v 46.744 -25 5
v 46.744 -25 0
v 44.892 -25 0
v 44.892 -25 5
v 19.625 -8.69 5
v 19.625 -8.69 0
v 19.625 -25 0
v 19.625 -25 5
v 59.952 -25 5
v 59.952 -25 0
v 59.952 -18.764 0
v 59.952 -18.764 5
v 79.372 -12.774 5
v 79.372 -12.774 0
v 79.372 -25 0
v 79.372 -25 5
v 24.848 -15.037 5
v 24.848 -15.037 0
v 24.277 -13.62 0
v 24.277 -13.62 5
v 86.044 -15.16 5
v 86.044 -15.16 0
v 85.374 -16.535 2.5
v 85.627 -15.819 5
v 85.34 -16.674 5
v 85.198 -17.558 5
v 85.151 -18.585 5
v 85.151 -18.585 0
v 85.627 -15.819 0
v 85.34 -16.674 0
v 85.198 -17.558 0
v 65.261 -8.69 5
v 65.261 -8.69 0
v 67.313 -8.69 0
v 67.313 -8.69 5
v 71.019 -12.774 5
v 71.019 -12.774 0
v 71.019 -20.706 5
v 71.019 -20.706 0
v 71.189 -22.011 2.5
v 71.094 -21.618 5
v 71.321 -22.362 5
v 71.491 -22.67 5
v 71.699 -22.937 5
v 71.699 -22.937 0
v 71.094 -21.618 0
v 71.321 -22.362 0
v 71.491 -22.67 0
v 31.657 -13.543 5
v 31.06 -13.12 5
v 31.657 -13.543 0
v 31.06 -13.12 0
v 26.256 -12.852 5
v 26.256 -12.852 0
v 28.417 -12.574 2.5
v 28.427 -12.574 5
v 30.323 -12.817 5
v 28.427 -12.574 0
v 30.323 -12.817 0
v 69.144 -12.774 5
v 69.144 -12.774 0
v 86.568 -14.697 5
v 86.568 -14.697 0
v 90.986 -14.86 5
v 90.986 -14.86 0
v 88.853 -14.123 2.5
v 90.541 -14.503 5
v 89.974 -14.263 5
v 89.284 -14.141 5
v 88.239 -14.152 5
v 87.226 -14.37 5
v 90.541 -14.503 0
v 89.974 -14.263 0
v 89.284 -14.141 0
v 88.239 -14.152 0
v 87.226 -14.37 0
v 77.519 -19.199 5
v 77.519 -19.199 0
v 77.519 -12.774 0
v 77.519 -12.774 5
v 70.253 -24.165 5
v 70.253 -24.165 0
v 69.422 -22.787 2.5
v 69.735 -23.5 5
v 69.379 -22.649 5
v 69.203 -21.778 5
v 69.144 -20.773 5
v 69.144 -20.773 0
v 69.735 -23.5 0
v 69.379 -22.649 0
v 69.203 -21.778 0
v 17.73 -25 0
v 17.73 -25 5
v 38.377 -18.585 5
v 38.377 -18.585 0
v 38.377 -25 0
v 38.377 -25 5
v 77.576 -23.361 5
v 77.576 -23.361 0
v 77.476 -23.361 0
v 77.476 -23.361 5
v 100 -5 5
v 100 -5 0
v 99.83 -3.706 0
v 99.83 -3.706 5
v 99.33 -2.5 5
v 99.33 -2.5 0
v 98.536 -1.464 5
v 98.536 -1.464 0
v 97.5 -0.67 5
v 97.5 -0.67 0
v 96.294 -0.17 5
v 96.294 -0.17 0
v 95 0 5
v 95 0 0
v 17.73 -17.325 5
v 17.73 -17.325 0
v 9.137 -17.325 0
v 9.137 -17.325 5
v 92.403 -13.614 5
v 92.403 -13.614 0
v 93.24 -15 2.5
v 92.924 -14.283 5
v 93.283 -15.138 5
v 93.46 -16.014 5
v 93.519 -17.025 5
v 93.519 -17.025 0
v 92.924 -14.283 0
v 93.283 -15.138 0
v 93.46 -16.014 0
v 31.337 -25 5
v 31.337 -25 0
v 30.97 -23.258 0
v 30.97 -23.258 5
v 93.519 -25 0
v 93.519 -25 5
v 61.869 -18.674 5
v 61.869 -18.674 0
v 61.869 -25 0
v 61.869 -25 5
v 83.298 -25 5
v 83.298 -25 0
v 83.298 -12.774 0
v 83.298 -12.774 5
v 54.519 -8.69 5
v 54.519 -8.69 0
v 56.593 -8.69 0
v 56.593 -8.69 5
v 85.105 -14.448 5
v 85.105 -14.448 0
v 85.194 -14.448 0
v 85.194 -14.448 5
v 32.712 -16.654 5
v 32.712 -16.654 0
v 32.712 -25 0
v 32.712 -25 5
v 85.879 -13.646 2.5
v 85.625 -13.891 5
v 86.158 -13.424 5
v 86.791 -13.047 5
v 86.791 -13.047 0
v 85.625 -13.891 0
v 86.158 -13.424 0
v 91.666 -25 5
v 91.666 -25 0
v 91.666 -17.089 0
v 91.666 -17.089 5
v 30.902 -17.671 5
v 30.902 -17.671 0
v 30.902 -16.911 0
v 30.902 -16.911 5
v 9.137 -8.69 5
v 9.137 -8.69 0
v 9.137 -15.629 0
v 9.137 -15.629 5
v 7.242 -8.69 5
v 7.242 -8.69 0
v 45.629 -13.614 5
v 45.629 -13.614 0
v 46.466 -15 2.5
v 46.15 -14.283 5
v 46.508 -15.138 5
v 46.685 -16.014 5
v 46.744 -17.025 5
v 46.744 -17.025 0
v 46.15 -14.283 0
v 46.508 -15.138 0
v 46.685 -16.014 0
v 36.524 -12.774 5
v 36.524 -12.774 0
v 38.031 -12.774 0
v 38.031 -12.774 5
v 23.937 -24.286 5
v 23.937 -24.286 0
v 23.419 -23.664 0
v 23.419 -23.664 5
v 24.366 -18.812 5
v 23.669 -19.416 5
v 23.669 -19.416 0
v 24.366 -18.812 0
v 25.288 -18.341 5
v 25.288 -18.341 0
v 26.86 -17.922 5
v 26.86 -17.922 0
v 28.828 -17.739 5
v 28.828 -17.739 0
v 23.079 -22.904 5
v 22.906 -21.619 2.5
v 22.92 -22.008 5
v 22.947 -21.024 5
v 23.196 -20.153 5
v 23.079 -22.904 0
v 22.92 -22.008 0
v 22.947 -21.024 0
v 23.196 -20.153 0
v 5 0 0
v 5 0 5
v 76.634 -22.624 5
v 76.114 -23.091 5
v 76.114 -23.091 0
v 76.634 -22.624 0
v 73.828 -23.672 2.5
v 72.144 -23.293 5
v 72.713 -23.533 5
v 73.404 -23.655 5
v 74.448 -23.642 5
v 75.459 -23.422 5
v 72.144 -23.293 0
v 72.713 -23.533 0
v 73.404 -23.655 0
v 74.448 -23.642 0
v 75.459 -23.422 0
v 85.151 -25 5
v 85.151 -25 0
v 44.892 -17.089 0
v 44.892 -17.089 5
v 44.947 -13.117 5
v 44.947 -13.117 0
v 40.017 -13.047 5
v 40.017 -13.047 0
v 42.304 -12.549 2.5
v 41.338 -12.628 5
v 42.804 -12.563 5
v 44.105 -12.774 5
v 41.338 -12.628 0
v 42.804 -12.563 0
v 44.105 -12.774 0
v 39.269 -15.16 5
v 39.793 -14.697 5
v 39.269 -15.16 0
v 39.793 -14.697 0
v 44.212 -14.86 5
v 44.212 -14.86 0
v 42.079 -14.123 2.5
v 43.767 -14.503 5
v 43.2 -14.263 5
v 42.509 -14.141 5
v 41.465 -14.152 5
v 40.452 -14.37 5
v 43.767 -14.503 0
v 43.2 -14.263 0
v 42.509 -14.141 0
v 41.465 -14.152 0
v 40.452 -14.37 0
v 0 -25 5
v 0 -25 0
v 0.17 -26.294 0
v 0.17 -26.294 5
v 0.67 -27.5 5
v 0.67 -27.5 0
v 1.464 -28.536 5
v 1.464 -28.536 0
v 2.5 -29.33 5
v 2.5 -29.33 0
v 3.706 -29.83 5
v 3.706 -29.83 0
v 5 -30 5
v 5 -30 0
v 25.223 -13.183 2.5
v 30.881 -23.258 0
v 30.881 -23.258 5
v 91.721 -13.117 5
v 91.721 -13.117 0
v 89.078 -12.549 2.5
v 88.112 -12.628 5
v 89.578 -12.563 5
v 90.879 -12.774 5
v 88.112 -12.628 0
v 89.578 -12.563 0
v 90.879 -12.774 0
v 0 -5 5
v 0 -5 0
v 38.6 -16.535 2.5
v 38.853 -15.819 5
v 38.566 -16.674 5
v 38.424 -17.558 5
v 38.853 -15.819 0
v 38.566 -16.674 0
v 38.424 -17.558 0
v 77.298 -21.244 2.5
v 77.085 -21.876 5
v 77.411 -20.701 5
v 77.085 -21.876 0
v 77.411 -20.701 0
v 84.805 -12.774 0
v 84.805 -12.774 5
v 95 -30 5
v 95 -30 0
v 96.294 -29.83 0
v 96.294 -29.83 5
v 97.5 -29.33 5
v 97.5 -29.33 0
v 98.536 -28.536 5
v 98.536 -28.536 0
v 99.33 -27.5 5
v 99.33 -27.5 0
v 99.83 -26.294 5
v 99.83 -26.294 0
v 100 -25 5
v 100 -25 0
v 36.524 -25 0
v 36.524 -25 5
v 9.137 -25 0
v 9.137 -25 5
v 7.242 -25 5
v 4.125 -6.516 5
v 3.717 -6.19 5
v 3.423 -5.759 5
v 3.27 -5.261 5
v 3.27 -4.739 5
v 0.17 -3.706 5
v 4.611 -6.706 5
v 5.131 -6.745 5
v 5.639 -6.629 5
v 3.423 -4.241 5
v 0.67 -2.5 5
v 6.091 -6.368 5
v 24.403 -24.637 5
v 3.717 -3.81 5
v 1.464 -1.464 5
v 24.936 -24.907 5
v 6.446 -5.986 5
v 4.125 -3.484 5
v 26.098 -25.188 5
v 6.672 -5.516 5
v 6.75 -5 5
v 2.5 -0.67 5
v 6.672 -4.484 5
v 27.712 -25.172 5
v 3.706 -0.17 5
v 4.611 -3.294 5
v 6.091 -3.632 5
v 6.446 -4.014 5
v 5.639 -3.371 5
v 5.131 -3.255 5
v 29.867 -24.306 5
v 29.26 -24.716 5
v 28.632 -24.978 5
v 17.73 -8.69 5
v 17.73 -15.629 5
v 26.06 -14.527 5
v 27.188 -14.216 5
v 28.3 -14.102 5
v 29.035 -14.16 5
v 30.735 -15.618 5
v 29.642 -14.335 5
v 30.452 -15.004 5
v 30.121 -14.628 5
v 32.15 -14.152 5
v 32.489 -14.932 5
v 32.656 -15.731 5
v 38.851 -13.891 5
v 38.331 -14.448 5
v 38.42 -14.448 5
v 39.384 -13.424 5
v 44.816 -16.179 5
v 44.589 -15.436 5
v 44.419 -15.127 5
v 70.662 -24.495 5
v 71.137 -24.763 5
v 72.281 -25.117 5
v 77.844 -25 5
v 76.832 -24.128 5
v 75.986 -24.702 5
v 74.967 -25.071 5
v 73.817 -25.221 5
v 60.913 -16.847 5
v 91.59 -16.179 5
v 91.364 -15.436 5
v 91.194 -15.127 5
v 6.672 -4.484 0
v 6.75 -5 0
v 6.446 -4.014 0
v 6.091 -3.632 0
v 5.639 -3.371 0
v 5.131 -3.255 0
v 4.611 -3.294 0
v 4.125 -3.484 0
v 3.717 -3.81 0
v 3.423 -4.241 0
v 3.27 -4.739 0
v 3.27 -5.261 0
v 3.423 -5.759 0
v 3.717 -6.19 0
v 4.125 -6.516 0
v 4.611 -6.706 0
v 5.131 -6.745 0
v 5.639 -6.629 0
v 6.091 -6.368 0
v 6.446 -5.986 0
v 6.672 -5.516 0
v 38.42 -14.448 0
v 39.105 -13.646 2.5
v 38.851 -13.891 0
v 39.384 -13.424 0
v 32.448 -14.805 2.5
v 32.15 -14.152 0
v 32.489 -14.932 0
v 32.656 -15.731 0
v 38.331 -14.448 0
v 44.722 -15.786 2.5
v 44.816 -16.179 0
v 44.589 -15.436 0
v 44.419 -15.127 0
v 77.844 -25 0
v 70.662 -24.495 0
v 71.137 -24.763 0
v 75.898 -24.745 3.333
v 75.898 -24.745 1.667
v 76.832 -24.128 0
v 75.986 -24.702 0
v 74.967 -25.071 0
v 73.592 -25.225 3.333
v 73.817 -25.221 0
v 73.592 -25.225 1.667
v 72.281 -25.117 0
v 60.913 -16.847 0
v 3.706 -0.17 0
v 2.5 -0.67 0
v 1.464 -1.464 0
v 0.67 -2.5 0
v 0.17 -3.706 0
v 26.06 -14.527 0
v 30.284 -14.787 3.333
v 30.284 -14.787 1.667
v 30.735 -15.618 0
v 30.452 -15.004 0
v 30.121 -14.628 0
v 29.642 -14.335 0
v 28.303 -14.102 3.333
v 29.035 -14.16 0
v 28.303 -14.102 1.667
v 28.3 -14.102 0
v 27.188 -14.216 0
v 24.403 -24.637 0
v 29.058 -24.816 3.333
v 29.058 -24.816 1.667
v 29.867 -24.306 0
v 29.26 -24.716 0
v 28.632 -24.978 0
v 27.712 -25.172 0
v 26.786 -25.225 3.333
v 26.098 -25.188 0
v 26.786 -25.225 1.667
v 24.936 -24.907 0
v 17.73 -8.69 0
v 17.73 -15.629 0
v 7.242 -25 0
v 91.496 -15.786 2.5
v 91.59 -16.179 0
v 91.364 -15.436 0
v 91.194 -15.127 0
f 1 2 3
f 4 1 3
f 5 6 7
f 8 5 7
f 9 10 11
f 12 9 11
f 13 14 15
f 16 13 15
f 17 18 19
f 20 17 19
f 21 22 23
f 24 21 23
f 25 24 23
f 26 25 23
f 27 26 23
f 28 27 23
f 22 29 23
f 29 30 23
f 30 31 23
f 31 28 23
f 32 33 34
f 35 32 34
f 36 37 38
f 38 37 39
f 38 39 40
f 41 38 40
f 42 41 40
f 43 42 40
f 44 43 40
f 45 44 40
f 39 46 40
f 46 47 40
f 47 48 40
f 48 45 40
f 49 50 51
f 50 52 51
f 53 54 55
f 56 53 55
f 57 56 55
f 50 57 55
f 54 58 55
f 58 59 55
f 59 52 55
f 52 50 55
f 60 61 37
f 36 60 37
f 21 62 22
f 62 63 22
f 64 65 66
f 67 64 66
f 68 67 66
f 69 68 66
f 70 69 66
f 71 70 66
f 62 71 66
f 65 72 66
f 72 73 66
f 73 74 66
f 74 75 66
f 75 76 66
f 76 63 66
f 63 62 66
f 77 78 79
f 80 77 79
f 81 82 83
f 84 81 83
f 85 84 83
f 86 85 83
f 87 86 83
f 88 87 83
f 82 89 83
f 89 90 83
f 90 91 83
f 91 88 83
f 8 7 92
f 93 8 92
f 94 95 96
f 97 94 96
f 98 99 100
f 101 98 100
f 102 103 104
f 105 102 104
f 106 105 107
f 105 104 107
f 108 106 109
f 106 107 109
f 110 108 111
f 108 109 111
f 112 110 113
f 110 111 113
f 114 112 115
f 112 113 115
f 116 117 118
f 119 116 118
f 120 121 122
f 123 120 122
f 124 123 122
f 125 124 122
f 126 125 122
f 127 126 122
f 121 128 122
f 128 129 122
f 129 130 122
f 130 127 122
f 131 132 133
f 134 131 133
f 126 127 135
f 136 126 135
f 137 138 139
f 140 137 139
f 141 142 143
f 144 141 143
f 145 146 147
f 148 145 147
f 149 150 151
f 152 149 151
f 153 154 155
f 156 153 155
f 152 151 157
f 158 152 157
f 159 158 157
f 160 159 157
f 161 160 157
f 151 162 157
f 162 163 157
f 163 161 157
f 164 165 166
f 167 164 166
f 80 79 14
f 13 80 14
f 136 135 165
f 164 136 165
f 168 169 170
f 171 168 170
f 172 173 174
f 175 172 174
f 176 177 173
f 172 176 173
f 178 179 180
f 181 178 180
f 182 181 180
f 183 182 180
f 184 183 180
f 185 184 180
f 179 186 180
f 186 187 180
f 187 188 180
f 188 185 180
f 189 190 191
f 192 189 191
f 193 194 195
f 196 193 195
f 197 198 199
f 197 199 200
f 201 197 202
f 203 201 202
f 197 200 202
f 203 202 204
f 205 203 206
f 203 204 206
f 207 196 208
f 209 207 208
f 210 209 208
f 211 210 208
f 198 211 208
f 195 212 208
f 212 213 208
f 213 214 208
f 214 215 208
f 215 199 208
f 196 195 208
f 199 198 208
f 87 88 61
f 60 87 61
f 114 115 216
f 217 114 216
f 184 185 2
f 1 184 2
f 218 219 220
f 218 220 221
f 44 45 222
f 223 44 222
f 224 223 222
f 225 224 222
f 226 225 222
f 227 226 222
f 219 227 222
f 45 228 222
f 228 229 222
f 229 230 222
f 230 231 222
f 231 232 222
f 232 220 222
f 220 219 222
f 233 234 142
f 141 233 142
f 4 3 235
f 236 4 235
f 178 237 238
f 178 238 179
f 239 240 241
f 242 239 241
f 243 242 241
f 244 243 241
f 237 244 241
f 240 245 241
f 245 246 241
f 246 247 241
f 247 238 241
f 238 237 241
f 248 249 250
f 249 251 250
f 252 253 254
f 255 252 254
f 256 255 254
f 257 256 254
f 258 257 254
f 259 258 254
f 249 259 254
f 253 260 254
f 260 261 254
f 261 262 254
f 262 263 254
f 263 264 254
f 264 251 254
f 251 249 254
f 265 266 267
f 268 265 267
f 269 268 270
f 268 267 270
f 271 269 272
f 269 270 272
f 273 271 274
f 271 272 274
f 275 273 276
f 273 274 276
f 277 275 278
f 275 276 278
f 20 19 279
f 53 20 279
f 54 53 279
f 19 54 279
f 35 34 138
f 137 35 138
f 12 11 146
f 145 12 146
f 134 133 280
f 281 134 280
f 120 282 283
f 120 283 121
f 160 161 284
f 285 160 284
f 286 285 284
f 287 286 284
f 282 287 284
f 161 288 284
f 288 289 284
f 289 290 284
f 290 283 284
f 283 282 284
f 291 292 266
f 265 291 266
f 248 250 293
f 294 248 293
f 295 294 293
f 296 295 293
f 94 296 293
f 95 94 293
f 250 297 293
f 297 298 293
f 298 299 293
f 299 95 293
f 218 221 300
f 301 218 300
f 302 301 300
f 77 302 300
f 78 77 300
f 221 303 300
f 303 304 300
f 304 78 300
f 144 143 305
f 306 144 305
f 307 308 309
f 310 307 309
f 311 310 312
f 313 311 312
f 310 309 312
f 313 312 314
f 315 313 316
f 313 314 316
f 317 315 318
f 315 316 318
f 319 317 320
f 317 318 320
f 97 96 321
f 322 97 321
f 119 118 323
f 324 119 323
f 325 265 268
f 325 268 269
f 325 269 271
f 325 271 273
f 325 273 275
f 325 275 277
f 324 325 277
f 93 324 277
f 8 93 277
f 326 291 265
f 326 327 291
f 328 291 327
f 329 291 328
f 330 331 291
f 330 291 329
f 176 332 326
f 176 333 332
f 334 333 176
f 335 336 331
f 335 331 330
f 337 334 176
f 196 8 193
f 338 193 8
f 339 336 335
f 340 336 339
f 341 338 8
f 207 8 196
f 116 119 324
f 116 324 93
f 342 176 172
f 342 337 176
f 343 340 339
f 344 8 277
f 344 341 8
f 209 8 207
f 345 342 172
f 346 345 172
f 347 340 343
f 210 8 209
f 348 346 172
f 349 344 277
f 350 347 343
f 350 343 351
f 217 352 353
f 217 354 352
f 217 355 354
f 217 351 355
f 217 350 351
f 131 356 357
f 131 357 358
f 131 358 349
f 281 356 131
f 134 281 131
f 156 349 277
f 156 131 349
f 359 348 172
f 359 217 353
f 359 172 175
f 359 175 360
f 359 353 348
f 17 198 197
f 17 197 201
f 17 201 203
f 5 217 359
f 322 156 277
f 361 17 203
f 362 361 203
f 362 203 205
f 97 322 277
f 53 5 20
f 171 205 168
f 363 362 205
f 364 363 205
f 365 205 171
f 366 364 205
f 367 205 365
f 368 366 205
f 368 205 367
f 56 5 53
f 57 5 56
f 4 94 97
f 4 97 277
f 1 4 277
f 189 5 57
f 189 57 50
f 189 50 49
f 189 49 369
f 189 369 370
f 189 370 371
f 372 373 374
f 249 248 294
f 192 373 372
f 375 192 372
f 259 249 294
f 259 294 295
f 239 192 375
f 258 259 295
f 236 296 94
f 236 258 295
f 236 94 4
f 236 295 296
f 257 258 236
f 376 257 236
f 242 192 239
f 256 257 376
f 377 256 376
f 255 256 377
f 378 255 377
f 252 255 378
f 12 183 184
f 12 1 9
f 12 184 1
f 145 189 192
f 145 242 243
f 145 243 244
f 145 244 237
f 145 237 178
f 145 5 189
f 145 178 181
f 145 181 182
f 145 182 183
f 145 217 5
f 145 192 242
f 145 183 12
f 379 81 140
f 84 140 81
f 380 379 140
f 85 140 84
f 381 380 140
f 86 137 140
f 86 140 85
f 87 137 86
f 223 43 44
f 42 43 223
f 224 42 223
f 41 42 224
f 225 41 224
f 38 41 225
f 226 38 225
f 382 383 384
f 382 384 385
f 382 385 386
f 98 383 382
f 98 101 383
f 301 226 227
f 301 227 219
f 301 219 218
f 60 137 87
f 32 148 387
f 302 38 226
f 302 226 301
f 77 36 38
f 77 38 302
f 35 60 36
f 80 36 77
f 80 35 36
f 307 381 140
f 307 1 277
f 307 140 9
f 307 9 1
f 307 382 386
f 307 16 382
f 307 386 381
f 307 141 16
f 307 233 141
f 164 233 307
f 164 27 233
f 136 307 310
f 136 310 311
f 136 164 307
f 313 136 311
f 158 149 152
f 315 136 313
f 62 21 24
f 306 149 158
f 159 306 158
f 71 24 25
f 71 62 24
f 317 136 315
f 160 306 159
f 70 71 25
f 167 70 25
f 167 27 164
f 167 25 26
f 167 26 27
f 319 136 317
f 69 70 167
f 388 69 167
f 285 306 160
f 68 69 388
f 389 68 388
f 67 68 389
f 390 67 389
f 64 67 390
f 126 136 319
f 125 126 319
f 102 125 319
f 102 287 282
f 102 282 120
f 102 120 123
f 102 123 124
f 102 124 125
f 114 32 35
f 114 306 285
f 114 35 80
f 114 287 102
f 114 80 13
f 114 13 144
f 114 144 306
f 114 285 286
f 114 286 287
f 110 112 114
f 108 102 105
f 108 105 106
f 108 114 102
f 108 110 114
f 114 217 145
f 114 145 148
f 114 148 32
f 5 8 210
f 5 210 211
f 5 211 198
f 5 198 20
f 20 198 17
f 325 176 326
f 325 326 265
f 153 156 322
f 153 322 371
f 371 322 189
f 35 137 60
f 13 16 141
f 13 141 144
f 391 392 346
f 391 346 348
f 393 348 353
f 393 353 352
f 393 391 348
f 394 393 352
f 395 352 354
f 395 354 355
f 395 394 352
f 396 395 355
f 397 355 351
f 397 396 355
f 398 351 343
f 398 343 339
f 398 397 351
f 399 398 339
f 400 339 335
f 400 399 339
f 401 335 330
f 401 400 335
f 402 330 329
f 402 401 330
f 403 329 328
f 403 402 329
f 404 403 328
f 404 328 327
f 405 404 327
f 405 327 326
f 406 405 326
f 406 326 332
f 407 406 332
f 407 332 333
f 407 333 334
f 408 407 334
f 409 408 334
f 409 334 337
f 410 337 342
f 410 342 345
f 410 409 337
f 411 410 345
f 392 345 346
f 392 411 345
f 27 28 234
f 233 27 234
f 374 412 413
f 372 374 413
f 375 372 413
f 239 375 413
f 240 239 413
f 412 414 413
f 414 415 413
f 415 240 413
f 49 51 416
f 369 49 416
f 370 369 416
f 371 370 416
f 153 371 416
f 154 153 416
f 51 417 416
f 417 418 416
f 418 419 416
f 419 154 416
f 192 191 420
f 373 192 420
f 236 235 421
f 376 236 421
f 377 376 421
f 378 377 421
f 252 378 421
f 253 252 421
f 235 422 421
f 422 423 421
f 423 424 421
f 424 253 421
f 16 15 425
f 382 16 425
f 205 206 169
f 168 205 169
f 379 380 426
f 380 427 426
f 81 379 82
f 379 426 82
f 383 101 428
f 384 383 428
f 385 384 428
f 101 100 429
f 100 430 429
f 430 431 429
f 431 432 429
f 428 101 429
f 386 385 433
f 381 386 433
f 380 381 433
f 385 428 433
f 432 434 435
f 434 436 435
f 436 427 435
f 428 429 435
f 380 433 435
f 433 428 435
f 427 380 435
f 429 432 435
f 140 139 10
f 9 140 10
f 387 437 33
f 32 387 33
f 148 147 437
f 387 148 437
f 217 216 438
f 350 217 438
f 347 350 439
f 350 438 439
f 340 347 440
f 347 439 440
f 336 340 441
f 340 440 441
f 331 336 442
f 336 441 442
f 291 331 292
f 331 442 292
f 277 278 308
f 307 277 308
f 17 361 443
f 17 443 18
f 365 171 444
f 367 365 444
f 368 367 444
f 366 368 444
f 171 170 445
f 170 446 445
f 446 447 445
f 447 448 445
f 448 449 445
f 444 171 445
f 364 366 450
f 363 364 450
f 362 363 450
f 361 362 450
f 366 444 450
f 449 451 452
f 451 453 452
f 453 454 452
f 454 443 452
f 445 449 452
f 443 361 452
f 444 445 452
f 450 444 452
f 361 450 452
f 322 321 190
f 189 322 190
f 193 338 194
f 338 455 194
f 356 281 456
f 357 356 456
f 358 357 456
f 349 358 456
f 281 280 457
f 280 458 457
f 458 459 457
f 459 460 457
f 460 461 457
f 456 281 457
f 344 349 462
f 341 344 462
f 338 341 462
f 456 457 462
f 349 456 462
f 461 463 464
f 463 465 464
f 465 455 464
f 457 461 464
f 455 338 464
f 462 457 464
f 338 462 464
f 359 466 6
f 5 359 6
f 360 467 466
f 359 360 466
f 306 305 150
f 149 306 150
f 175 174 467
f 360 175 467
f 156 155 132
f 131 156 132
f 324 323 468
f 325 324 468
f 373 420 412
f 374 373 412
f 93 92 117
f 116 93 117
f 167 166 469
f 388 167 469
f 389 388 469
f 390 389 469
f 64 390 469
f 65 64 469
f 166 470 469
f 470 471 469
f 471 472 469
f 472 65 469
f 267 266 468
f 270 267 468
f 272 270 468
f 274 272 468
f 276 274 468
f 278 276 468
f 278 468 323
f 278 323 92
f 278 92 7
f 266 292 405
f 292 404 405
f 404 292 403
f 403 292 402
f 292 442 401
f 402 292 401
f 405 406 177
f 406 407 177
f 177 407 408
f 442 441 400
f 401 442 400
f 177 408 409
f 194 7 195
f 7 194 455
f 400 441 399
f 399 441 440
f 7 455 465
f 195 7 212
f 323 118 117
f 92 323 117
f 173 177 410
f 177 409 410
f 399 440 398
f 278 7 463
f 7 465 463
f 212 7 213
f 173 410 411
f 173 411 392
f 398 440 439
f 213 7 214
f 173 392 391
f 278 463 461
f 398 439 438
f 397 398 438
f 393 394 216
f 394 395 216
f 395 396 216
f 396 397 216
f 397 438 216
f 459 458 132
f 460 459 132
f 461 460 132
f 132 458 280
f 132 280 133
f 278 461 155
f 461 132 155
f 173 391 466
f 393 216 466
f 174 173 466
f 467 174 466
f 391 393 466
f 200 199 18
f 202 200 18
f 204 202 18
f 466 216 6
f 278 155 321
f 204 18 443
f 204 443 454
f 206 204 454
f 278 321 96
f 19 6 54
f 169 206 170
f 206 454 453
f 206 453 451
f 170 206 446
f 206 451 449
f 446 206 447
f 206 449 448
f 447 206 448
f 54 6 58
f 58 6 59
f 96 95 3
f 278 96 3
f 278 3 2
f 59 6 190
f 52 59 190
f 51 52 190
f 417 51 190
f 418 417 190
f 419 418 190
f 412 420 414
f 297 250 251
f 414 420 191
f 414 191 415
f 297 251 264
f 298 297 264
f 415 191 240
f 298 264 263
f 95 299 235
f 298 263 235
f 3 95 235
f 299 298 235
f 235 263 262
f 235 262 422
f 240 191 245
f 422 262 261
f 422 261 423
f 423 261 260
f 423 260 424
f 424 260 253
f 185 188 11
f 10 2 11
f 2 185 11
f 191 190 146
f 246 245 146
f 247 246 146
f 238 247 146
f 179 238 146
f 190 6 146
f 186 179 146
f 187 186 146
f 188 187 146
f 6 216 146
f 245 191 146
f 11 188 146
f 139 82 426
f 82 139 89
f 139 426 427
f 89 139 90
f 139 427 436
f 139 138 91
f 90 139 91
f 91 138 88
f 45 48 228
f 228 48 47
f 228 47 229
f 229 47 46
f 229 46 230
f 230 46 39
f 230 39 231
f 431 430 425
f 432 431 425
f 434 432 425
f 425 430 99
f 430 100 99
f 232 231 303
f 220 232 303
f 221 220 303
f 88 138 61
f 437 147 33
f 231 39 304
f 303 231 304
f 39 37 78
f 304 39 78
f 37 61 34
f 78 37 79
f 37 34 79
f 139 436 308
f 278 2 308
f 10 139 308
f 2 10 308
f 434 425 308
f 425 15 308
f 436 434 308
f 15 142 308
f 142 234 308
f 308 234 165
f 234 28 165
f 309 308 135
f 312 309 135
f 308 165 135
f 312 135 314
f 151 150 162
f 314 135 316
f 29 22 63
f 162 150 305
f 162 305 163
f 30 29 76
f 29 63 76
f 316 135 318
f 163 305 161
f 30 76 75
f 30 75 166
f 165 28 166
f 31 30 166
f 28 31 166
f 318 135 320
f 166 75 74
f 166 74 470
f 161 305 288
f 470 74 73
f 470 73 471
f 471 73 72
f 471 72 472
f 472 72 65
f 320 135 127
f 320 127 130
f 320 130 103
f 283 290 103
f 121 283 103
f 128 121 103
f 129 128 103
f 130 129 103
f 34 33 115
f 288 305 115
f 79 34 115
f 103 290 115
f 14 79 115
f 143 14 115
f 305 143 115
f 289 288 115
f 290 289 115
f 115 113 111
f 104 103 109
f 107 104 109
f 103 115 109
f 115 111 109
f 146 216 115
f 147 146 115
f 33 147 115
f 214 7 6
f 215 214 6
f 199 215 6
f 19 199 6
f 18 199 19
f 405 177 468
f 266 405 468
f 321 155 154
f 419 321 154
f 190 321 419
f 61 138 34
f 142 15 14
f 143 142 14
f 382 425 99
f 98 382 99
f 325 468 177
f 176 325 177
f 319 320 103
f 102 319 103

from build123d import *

# Parameters (mm, degrees)
F0_R     = 1.75
F1_DEPTH = 5


with BuildPart() as f1:
    # F0 (on Top) → F1 (new body)
    with BuildSketch(Plane.XY):
        with BuildLine():
            Line((95, 0), (5, 0))
            ThreePointArc((5, 0), (1.4644660941, -1.4644660941), (0, -5))
            Line((0, -5), (0, -25))
            ThreePointArc((0, -25), (1.4644660941, -28.5355339059), (5, -30))
            Line((5, -30), (95, -30))
            ThreePointArc((95, -30), (98.5355339059, -28.5355339059), (100, -25))
            Line((100, -25), (100, -5))
            ThreePointArc((100, -5), (98.5355339059, -1.4644660941), (95, 0))
        make_face()
        Polygon((19.6251784864, -8.6899095669), (19.6251784864, -25), (17.7296525464, -25), (17.7296525464, -17.3250832937), (9.137315564, -17.3250832937), (9.137315564, -25), (7.241789624, -25), (7.241789624, -8.6899095669), (9.137315564, -8.6899095669), (9.137315564, -15.6294621609), (17.7296525464, -15.6294621609), (17.7296525464, -8.6899095669), align=None, mode=Mode.SUBTRACT)
        with BuildLine():
            Line((32.7118039029, -25), (31.3374583532, -25))
            Line((31.3374583532, -25), (30.969776297, -23.2579723941))
            Line((30.969776297, -23.2579723941), (30.8805330795, -23.2579723941))
            add(Edge.make_bspline(
                [(30.8805330795, -23.2579723941), (29.9666825321, -24.4074250357), (29.0581865778, -24.8161589719)],
                knots=[0, 0, 0, 1, 1, 1], degree=2))
            add(Edge.make_bspline(
                [(29.0581865778, -24.8161589719), (28.1496906235, -25.2248929081), (26.7860542599, -25.2248929081)],
                knots=[0, 0, 0, 1, 1, 1], degree=2))
            add(Edge.make_bspline(
                [(26.7860542599, -25.2248929081), (24.9690623513, -25.2248929081), (23.9374107568, -24.2860542599)],
                knots=[0, 0, 0, 1, 1, 1], degree=2))
            add(Edge.make_bspline(
                [(23.9374107568, -24.2860542599), (22.9057591623, -23.3472156116), (22.9057591623, -21.6194669205)],
                knots=[0, 0, 0, 1, 1, 1], degree=2))
            add(Edge.make_bspline(
                [(22.9057591623, -21.6194669205), (22.9057591623, -17.917658258), (28.8279390766, -17.7391718229)],
                knots=[0, 0, 0, 1, 1, 1], degree=2))
            Line((28.8279390766, -17.7391718229), (30.9019514517, -17.6713469776))
            Line((30.9019514517, -17.6713469776), (30.9019514517, -16.9109947644))
            add(Edge.make_bspline(
                [(30.9019514517, -16.9109947644), (30.9019514517, -15.472394098), (30.2843883865, -14.7870061875)],
                knots=[0, 0, 0, 1, 1, 1], degree=2))
            add(Edge.make_bspline(
                [(30.2843883865, -14.7870061875), (29.6668253213, -14.101618277), (28.3031889576, -14.101618277)],
                knots=[0, 0, 0, 1, 1, 1], degree=2))
            add(Edge.make_bspline(
                [(28.3031889576, -14.101618277), (26.7753450738, -14.101618277), (24.8476915754, -15.0368871966)],
                knots=[0, 0, 0, 1, 1, 1], degree=2))
            Line((24.8476915754, -15.0368871966), (24.2765349833, -13.6197049024))
            add(Edge.make_bspline(
                [(24.2765349833, -13.6197049024), (25.1796763446, -13.1306520704), (26.2559495478, -12.8522132318)],
                knots=[0, 0, 0, 1, 1, 1], degree=2))
            add(Edge.make_bspline(
                [(26.2559495478, -12.8522132318), (27.3322227511, -12.5737743931), (28.4174202761, -12.5737743931)],
                knots=[0, 0, 0, 1, 1, 1], degree=2))
            add(Edge.make_bspline(
                [(28.4174202761, -12.5737743931), (30.6020942408, -12.5737743931), (31.6569490719, -13.5429557354)],
                knots=[0, 0, 0, 1, 1, 1], degree=2))
            add(Edge.make_bspline(
                [(31.6569490719, -13.5429557354), (32.7118039029, -14.5121370776), (32.7118039029, -16.653974298)],
                knots=[0, 0, 0, 1, 1, 1], degree=2))
            Line((32.7118039029, -16.653974298), (32.7118039029, -25))
        make_face(mode=Mode.SUBTRACT)
        with BuildLine():
            Line((46.744407425, -25), (44.8917182294, -25))
            Line((44.8917182294, -25), (44.8917182294, -17.0894811994))
            add(Edge.make_bspline(
                [(44.8917182294, -17.0894811994), (44.8917182294, -15.5973346026), (44.2116849119, -14.8601856259)],
                knots=[0, 0, 0, 1, 1, 1], degree=2))
            add(Edge.make_bspline(
                [(44.2116849119, -14.8601856259), (43.5316515945, -14.1230366492), (42.0787720133, -14.1230366492)],
                knots=[0, 0, 0, 1, 1, 1], degree=2))
            add(Edge.make_bspline(
                [(42.0787720133, -14.1230366492), (40.1618277011, -14.1230366492), (39.2693955259, -15.1600428367)],
                knots=[0, 0, 0, 1, 1, 1], degree=2))
            add(Edge.make_bspline(
                [(39.2693955259, -15.1600428367), (38.3769633508, -16.1970490243), (38.3769633508, -18.585197525)],
                knots=[0, 0, 0, 1, 1, 1], degree=2))
            Line((38.3769633508, -18.585197525), (38.3769633508, -25))
            Line((38.3769633508, -25), (36.5242741552, -25))
            Line((36.5242741552, -25), (36.5242741552, -12.7736792004))
            Line((36.5242741552, -12.7736792004), (38.0306996668, -12.7736792004))
            Line((38.0306996668, -12.7736792004), (38.3305568777, -14.447881961))
            Line((38.3305568777, -14.447881961), (38.4198000952, -14.447881961))
            add(Edge.make_bspline(
                [(38.4198000952, -14.447881961), (38.9909566873, -13.5447405997), (40.0172536887, -13.046763446)],
                knots=[0, 0, 0, 1, 1, 1], degree=2))
            add(Edge.make_bspline(
                [(40.0172536887, -13.046763446), (41.0435506901, -12.5487862922), (42.3036649215, -12.5487862922)],
                knots=[0, 0, 0, 1, 1, 1], degree=2))
            add(Edge.make_bspline(
                [(42.3036649215, -12.5487862922), (44.5133269871, -12.5487862922), (45.6288672061, -13.6143503094)],
                knots=[0, 0, 0, 1, 1, 1], degree=2))
            add(Edge.make_bspline(
                [(45.6288672061, -13.6143503094), (46.744407425, -14.6799143265), (46.744407425, -17.0252260828)],
                knots=[0, 0, 0, 1, 1, 1], degree=2))
            Line((46.744407425, -17.0252260828), (46.744407425, -25))
        make_face(mode=Mode.SUBTRACT)
        with BuildLine():
            Line((69.1444550214, -12.7736792004), (71.0185625892, -12.7736792004))
            Line((71.0185625892, -12.7736792004), (71.0185625892, -20.7056163732))
            add(Edge.make_bspline(
                [(71.0185625892, -20.7056163732), (71.0185625892, -22.2013326987), (71.6985959067, -22.936696811)],
                knots=[0, 0, 0, 1, 1, 1], degree=2))
            add(Edge.make_bspline(
                [(71.6985959067, -22.936696811), (72.3786292242, -23.6720609234), (73.8279390766, -23.6720609234)],
                knots=[0, 0, 0, 1, 1, 1], degree=2))
            add(Edge.make_bspline(
                [(73.8279390766, -23.6720609234), (75.7484531176, -23.6720609234), (76.6337458353, -22.6243455497)],
                knots=[0, 0, 0, 1, 1, 1], degree=2))
            add(Edge.make_bspline(
                [(76.6337458353, -22.6243455497), (77.5190385531, -21.5766301761), (77.5190385531, -19.1991908615)],
                knots=[0, 0, 0, 1, 1, 1], degree=2))
            Line((77.5190385531, -19.1991908615), (77.5190385531, -12.7736792004))
            Line((77.5190385531, -12.7736792004), (79.3717277487, -12.7736792004))
            Line((79.3717277487, -12.7736792004), (79.3717277487, -25))
            Line((79.3717277487, -25), (77.8438838648, -25))
            Line((77.8438838648, -25), (77.5761542123, -23.3614945264))
            Line((77.5761542123, -23.3614945264), (77.4762018087, -23.3614945264))
            add(Edge.make_bspline(
                [(77.4762018087, -23.3614945264), (76.9086149453, -24.2646358877), (75.898381723, -24.7447643979)],
                knots=[0, 0, 0, 1, 1, 1], degree=2))
            add(Edge.make_bspline(
                [(75.898381723, -24.7447643979), (74.8881485007, -25.2248929081), (73.5923369824, -25.2248929081)],
                knots=[0, 0, 0, 1, 1, 1], degree=2))
            add(Edge.make_bspline(
                [(73.5923369824, -25.2248929081), (71.3612565445, -25.2248929081), (70.252855783, -24.1646834841)],
                knots=[0, 0, 0, 1, 1, 1], degree=2))
            add(Edge.make_bspline(
                [(70.252855783, -24.1646834841), (69.1444550214, -23.10447406), (69.1444550214, -20.7734412185)],
                knots=[0, 0, 0, 1, 1, 1], degree=2))
            Line((69.1444550214, -20.7734412185), (69.1444550214, -12.7736792004))
        make_face(mode=Mode.SUBTRACT)
        Polygon((56.59328891, -8.6899095669), (60.9126606378, -16.8467396478), (65.2605901951, -8.6899095669), (67.313184198, -8.6899095669), (61.8693479296, -18.6744407425), (61.8693479296, -25), (59.9524036173, -25), (59.9524036173, -18.76368396), (54.519276535, -8.6899095669), align=None, mode=Mode.SUBTRACT)
        with BuildLine():
            Line((93.5185625892, -25), (91.6658733936, -25))
            Line((91.6658733936, -25), (91.6658733936, -17.0894811994))
            add(Edge.make_bspline(
                [(91.6658733936, -17.0894811994), (91.6658733936, -15.5973346026), (90.9858400762, -14.8601856259)],
                knots=[0, 0, 0, 1, 1, 1], degree=2))
            add(Edge.make_bspline(
                [(90.9858400762, -14.8601856259), (90.3058067587, -14.1230366492), (88.8529271775, -14.1230366492)],
                knots=[0, 0, 0, 1, 1, 1], degree=2))
            add(Edge.make_bspline(
                [(88.8529271775, -14.1230366492), (86.9359828653, -14.1230366492), (86.0435506901, -15.1600428367)],
                knots=[0, 0, 0, 1, 1, 1], degree=2))
            add(Edge.make_bspline(
                [(86.0435506901, -15.1600428367), (85.151118515, -16.1970490243), (85.151118515, -18.585197525)],
                knots=[0, 0, 0, 1, 1, 1], degree=2))
            Line((85.151118515, -18.585197525), (85.151118515, -25))
            Line((85.151118515, -25), (83.2984293194, -25))
            Line((83.2984293194, -25), (83.2984293194, -12.7736792004))
            Line((83.2984293194, -12.7736792004), (84.804854831, -12.7736792004))
            Line((84.804854831, -12.7736792004), (85.1047120419, -14.447881961))
            Line((85.1047120419, -14.447881961), (85.1939552594, -14.447881961))
            add(Edge.make_bspline(
                [(85.1939552594, -14.447881961), (85.7651118515, -13.5447405997), (86.7914088529, -13.046763446)],
                knots=[0, 0, 0, 1, 1, 1], degree=2))
            add(Edge.make_bspline(
                [(86.7914088529, -13.046763446), (87.8177058544, -12.5487862922), (89.0778200857, -12.5487862922)],
                knots=[0, 0, 0, 1, 1, 1], degree=2))
            add(Edge.make_bspline(
                [(89.0778200857, -12.5487862922), (91.2874821514, -12.5487862922), (92.4030223703, -13.6143503094)],
                knots=[0, 0, 0, 1, 1, 1], degree=2))
            add(Edge.make_bspline(
                [(92.4030223703, -13.6143503094), (93.5185625892, -14.6799143265), (93.5185625892, -17.0252260828)],
                knots=[0, 0, 0, 1, 1, 1], degree=2))
            Line((93.5185625892, -17.0252260828), (93.5185625892, -25))
        make_face(mode=Mode.SUBTRACT)
        with Locations((5, -5)):
            Circle(F0_R, mode=Mode.SUBTRACT)
    extrude(amount=F1_DEPTH)


solid = f1.part
